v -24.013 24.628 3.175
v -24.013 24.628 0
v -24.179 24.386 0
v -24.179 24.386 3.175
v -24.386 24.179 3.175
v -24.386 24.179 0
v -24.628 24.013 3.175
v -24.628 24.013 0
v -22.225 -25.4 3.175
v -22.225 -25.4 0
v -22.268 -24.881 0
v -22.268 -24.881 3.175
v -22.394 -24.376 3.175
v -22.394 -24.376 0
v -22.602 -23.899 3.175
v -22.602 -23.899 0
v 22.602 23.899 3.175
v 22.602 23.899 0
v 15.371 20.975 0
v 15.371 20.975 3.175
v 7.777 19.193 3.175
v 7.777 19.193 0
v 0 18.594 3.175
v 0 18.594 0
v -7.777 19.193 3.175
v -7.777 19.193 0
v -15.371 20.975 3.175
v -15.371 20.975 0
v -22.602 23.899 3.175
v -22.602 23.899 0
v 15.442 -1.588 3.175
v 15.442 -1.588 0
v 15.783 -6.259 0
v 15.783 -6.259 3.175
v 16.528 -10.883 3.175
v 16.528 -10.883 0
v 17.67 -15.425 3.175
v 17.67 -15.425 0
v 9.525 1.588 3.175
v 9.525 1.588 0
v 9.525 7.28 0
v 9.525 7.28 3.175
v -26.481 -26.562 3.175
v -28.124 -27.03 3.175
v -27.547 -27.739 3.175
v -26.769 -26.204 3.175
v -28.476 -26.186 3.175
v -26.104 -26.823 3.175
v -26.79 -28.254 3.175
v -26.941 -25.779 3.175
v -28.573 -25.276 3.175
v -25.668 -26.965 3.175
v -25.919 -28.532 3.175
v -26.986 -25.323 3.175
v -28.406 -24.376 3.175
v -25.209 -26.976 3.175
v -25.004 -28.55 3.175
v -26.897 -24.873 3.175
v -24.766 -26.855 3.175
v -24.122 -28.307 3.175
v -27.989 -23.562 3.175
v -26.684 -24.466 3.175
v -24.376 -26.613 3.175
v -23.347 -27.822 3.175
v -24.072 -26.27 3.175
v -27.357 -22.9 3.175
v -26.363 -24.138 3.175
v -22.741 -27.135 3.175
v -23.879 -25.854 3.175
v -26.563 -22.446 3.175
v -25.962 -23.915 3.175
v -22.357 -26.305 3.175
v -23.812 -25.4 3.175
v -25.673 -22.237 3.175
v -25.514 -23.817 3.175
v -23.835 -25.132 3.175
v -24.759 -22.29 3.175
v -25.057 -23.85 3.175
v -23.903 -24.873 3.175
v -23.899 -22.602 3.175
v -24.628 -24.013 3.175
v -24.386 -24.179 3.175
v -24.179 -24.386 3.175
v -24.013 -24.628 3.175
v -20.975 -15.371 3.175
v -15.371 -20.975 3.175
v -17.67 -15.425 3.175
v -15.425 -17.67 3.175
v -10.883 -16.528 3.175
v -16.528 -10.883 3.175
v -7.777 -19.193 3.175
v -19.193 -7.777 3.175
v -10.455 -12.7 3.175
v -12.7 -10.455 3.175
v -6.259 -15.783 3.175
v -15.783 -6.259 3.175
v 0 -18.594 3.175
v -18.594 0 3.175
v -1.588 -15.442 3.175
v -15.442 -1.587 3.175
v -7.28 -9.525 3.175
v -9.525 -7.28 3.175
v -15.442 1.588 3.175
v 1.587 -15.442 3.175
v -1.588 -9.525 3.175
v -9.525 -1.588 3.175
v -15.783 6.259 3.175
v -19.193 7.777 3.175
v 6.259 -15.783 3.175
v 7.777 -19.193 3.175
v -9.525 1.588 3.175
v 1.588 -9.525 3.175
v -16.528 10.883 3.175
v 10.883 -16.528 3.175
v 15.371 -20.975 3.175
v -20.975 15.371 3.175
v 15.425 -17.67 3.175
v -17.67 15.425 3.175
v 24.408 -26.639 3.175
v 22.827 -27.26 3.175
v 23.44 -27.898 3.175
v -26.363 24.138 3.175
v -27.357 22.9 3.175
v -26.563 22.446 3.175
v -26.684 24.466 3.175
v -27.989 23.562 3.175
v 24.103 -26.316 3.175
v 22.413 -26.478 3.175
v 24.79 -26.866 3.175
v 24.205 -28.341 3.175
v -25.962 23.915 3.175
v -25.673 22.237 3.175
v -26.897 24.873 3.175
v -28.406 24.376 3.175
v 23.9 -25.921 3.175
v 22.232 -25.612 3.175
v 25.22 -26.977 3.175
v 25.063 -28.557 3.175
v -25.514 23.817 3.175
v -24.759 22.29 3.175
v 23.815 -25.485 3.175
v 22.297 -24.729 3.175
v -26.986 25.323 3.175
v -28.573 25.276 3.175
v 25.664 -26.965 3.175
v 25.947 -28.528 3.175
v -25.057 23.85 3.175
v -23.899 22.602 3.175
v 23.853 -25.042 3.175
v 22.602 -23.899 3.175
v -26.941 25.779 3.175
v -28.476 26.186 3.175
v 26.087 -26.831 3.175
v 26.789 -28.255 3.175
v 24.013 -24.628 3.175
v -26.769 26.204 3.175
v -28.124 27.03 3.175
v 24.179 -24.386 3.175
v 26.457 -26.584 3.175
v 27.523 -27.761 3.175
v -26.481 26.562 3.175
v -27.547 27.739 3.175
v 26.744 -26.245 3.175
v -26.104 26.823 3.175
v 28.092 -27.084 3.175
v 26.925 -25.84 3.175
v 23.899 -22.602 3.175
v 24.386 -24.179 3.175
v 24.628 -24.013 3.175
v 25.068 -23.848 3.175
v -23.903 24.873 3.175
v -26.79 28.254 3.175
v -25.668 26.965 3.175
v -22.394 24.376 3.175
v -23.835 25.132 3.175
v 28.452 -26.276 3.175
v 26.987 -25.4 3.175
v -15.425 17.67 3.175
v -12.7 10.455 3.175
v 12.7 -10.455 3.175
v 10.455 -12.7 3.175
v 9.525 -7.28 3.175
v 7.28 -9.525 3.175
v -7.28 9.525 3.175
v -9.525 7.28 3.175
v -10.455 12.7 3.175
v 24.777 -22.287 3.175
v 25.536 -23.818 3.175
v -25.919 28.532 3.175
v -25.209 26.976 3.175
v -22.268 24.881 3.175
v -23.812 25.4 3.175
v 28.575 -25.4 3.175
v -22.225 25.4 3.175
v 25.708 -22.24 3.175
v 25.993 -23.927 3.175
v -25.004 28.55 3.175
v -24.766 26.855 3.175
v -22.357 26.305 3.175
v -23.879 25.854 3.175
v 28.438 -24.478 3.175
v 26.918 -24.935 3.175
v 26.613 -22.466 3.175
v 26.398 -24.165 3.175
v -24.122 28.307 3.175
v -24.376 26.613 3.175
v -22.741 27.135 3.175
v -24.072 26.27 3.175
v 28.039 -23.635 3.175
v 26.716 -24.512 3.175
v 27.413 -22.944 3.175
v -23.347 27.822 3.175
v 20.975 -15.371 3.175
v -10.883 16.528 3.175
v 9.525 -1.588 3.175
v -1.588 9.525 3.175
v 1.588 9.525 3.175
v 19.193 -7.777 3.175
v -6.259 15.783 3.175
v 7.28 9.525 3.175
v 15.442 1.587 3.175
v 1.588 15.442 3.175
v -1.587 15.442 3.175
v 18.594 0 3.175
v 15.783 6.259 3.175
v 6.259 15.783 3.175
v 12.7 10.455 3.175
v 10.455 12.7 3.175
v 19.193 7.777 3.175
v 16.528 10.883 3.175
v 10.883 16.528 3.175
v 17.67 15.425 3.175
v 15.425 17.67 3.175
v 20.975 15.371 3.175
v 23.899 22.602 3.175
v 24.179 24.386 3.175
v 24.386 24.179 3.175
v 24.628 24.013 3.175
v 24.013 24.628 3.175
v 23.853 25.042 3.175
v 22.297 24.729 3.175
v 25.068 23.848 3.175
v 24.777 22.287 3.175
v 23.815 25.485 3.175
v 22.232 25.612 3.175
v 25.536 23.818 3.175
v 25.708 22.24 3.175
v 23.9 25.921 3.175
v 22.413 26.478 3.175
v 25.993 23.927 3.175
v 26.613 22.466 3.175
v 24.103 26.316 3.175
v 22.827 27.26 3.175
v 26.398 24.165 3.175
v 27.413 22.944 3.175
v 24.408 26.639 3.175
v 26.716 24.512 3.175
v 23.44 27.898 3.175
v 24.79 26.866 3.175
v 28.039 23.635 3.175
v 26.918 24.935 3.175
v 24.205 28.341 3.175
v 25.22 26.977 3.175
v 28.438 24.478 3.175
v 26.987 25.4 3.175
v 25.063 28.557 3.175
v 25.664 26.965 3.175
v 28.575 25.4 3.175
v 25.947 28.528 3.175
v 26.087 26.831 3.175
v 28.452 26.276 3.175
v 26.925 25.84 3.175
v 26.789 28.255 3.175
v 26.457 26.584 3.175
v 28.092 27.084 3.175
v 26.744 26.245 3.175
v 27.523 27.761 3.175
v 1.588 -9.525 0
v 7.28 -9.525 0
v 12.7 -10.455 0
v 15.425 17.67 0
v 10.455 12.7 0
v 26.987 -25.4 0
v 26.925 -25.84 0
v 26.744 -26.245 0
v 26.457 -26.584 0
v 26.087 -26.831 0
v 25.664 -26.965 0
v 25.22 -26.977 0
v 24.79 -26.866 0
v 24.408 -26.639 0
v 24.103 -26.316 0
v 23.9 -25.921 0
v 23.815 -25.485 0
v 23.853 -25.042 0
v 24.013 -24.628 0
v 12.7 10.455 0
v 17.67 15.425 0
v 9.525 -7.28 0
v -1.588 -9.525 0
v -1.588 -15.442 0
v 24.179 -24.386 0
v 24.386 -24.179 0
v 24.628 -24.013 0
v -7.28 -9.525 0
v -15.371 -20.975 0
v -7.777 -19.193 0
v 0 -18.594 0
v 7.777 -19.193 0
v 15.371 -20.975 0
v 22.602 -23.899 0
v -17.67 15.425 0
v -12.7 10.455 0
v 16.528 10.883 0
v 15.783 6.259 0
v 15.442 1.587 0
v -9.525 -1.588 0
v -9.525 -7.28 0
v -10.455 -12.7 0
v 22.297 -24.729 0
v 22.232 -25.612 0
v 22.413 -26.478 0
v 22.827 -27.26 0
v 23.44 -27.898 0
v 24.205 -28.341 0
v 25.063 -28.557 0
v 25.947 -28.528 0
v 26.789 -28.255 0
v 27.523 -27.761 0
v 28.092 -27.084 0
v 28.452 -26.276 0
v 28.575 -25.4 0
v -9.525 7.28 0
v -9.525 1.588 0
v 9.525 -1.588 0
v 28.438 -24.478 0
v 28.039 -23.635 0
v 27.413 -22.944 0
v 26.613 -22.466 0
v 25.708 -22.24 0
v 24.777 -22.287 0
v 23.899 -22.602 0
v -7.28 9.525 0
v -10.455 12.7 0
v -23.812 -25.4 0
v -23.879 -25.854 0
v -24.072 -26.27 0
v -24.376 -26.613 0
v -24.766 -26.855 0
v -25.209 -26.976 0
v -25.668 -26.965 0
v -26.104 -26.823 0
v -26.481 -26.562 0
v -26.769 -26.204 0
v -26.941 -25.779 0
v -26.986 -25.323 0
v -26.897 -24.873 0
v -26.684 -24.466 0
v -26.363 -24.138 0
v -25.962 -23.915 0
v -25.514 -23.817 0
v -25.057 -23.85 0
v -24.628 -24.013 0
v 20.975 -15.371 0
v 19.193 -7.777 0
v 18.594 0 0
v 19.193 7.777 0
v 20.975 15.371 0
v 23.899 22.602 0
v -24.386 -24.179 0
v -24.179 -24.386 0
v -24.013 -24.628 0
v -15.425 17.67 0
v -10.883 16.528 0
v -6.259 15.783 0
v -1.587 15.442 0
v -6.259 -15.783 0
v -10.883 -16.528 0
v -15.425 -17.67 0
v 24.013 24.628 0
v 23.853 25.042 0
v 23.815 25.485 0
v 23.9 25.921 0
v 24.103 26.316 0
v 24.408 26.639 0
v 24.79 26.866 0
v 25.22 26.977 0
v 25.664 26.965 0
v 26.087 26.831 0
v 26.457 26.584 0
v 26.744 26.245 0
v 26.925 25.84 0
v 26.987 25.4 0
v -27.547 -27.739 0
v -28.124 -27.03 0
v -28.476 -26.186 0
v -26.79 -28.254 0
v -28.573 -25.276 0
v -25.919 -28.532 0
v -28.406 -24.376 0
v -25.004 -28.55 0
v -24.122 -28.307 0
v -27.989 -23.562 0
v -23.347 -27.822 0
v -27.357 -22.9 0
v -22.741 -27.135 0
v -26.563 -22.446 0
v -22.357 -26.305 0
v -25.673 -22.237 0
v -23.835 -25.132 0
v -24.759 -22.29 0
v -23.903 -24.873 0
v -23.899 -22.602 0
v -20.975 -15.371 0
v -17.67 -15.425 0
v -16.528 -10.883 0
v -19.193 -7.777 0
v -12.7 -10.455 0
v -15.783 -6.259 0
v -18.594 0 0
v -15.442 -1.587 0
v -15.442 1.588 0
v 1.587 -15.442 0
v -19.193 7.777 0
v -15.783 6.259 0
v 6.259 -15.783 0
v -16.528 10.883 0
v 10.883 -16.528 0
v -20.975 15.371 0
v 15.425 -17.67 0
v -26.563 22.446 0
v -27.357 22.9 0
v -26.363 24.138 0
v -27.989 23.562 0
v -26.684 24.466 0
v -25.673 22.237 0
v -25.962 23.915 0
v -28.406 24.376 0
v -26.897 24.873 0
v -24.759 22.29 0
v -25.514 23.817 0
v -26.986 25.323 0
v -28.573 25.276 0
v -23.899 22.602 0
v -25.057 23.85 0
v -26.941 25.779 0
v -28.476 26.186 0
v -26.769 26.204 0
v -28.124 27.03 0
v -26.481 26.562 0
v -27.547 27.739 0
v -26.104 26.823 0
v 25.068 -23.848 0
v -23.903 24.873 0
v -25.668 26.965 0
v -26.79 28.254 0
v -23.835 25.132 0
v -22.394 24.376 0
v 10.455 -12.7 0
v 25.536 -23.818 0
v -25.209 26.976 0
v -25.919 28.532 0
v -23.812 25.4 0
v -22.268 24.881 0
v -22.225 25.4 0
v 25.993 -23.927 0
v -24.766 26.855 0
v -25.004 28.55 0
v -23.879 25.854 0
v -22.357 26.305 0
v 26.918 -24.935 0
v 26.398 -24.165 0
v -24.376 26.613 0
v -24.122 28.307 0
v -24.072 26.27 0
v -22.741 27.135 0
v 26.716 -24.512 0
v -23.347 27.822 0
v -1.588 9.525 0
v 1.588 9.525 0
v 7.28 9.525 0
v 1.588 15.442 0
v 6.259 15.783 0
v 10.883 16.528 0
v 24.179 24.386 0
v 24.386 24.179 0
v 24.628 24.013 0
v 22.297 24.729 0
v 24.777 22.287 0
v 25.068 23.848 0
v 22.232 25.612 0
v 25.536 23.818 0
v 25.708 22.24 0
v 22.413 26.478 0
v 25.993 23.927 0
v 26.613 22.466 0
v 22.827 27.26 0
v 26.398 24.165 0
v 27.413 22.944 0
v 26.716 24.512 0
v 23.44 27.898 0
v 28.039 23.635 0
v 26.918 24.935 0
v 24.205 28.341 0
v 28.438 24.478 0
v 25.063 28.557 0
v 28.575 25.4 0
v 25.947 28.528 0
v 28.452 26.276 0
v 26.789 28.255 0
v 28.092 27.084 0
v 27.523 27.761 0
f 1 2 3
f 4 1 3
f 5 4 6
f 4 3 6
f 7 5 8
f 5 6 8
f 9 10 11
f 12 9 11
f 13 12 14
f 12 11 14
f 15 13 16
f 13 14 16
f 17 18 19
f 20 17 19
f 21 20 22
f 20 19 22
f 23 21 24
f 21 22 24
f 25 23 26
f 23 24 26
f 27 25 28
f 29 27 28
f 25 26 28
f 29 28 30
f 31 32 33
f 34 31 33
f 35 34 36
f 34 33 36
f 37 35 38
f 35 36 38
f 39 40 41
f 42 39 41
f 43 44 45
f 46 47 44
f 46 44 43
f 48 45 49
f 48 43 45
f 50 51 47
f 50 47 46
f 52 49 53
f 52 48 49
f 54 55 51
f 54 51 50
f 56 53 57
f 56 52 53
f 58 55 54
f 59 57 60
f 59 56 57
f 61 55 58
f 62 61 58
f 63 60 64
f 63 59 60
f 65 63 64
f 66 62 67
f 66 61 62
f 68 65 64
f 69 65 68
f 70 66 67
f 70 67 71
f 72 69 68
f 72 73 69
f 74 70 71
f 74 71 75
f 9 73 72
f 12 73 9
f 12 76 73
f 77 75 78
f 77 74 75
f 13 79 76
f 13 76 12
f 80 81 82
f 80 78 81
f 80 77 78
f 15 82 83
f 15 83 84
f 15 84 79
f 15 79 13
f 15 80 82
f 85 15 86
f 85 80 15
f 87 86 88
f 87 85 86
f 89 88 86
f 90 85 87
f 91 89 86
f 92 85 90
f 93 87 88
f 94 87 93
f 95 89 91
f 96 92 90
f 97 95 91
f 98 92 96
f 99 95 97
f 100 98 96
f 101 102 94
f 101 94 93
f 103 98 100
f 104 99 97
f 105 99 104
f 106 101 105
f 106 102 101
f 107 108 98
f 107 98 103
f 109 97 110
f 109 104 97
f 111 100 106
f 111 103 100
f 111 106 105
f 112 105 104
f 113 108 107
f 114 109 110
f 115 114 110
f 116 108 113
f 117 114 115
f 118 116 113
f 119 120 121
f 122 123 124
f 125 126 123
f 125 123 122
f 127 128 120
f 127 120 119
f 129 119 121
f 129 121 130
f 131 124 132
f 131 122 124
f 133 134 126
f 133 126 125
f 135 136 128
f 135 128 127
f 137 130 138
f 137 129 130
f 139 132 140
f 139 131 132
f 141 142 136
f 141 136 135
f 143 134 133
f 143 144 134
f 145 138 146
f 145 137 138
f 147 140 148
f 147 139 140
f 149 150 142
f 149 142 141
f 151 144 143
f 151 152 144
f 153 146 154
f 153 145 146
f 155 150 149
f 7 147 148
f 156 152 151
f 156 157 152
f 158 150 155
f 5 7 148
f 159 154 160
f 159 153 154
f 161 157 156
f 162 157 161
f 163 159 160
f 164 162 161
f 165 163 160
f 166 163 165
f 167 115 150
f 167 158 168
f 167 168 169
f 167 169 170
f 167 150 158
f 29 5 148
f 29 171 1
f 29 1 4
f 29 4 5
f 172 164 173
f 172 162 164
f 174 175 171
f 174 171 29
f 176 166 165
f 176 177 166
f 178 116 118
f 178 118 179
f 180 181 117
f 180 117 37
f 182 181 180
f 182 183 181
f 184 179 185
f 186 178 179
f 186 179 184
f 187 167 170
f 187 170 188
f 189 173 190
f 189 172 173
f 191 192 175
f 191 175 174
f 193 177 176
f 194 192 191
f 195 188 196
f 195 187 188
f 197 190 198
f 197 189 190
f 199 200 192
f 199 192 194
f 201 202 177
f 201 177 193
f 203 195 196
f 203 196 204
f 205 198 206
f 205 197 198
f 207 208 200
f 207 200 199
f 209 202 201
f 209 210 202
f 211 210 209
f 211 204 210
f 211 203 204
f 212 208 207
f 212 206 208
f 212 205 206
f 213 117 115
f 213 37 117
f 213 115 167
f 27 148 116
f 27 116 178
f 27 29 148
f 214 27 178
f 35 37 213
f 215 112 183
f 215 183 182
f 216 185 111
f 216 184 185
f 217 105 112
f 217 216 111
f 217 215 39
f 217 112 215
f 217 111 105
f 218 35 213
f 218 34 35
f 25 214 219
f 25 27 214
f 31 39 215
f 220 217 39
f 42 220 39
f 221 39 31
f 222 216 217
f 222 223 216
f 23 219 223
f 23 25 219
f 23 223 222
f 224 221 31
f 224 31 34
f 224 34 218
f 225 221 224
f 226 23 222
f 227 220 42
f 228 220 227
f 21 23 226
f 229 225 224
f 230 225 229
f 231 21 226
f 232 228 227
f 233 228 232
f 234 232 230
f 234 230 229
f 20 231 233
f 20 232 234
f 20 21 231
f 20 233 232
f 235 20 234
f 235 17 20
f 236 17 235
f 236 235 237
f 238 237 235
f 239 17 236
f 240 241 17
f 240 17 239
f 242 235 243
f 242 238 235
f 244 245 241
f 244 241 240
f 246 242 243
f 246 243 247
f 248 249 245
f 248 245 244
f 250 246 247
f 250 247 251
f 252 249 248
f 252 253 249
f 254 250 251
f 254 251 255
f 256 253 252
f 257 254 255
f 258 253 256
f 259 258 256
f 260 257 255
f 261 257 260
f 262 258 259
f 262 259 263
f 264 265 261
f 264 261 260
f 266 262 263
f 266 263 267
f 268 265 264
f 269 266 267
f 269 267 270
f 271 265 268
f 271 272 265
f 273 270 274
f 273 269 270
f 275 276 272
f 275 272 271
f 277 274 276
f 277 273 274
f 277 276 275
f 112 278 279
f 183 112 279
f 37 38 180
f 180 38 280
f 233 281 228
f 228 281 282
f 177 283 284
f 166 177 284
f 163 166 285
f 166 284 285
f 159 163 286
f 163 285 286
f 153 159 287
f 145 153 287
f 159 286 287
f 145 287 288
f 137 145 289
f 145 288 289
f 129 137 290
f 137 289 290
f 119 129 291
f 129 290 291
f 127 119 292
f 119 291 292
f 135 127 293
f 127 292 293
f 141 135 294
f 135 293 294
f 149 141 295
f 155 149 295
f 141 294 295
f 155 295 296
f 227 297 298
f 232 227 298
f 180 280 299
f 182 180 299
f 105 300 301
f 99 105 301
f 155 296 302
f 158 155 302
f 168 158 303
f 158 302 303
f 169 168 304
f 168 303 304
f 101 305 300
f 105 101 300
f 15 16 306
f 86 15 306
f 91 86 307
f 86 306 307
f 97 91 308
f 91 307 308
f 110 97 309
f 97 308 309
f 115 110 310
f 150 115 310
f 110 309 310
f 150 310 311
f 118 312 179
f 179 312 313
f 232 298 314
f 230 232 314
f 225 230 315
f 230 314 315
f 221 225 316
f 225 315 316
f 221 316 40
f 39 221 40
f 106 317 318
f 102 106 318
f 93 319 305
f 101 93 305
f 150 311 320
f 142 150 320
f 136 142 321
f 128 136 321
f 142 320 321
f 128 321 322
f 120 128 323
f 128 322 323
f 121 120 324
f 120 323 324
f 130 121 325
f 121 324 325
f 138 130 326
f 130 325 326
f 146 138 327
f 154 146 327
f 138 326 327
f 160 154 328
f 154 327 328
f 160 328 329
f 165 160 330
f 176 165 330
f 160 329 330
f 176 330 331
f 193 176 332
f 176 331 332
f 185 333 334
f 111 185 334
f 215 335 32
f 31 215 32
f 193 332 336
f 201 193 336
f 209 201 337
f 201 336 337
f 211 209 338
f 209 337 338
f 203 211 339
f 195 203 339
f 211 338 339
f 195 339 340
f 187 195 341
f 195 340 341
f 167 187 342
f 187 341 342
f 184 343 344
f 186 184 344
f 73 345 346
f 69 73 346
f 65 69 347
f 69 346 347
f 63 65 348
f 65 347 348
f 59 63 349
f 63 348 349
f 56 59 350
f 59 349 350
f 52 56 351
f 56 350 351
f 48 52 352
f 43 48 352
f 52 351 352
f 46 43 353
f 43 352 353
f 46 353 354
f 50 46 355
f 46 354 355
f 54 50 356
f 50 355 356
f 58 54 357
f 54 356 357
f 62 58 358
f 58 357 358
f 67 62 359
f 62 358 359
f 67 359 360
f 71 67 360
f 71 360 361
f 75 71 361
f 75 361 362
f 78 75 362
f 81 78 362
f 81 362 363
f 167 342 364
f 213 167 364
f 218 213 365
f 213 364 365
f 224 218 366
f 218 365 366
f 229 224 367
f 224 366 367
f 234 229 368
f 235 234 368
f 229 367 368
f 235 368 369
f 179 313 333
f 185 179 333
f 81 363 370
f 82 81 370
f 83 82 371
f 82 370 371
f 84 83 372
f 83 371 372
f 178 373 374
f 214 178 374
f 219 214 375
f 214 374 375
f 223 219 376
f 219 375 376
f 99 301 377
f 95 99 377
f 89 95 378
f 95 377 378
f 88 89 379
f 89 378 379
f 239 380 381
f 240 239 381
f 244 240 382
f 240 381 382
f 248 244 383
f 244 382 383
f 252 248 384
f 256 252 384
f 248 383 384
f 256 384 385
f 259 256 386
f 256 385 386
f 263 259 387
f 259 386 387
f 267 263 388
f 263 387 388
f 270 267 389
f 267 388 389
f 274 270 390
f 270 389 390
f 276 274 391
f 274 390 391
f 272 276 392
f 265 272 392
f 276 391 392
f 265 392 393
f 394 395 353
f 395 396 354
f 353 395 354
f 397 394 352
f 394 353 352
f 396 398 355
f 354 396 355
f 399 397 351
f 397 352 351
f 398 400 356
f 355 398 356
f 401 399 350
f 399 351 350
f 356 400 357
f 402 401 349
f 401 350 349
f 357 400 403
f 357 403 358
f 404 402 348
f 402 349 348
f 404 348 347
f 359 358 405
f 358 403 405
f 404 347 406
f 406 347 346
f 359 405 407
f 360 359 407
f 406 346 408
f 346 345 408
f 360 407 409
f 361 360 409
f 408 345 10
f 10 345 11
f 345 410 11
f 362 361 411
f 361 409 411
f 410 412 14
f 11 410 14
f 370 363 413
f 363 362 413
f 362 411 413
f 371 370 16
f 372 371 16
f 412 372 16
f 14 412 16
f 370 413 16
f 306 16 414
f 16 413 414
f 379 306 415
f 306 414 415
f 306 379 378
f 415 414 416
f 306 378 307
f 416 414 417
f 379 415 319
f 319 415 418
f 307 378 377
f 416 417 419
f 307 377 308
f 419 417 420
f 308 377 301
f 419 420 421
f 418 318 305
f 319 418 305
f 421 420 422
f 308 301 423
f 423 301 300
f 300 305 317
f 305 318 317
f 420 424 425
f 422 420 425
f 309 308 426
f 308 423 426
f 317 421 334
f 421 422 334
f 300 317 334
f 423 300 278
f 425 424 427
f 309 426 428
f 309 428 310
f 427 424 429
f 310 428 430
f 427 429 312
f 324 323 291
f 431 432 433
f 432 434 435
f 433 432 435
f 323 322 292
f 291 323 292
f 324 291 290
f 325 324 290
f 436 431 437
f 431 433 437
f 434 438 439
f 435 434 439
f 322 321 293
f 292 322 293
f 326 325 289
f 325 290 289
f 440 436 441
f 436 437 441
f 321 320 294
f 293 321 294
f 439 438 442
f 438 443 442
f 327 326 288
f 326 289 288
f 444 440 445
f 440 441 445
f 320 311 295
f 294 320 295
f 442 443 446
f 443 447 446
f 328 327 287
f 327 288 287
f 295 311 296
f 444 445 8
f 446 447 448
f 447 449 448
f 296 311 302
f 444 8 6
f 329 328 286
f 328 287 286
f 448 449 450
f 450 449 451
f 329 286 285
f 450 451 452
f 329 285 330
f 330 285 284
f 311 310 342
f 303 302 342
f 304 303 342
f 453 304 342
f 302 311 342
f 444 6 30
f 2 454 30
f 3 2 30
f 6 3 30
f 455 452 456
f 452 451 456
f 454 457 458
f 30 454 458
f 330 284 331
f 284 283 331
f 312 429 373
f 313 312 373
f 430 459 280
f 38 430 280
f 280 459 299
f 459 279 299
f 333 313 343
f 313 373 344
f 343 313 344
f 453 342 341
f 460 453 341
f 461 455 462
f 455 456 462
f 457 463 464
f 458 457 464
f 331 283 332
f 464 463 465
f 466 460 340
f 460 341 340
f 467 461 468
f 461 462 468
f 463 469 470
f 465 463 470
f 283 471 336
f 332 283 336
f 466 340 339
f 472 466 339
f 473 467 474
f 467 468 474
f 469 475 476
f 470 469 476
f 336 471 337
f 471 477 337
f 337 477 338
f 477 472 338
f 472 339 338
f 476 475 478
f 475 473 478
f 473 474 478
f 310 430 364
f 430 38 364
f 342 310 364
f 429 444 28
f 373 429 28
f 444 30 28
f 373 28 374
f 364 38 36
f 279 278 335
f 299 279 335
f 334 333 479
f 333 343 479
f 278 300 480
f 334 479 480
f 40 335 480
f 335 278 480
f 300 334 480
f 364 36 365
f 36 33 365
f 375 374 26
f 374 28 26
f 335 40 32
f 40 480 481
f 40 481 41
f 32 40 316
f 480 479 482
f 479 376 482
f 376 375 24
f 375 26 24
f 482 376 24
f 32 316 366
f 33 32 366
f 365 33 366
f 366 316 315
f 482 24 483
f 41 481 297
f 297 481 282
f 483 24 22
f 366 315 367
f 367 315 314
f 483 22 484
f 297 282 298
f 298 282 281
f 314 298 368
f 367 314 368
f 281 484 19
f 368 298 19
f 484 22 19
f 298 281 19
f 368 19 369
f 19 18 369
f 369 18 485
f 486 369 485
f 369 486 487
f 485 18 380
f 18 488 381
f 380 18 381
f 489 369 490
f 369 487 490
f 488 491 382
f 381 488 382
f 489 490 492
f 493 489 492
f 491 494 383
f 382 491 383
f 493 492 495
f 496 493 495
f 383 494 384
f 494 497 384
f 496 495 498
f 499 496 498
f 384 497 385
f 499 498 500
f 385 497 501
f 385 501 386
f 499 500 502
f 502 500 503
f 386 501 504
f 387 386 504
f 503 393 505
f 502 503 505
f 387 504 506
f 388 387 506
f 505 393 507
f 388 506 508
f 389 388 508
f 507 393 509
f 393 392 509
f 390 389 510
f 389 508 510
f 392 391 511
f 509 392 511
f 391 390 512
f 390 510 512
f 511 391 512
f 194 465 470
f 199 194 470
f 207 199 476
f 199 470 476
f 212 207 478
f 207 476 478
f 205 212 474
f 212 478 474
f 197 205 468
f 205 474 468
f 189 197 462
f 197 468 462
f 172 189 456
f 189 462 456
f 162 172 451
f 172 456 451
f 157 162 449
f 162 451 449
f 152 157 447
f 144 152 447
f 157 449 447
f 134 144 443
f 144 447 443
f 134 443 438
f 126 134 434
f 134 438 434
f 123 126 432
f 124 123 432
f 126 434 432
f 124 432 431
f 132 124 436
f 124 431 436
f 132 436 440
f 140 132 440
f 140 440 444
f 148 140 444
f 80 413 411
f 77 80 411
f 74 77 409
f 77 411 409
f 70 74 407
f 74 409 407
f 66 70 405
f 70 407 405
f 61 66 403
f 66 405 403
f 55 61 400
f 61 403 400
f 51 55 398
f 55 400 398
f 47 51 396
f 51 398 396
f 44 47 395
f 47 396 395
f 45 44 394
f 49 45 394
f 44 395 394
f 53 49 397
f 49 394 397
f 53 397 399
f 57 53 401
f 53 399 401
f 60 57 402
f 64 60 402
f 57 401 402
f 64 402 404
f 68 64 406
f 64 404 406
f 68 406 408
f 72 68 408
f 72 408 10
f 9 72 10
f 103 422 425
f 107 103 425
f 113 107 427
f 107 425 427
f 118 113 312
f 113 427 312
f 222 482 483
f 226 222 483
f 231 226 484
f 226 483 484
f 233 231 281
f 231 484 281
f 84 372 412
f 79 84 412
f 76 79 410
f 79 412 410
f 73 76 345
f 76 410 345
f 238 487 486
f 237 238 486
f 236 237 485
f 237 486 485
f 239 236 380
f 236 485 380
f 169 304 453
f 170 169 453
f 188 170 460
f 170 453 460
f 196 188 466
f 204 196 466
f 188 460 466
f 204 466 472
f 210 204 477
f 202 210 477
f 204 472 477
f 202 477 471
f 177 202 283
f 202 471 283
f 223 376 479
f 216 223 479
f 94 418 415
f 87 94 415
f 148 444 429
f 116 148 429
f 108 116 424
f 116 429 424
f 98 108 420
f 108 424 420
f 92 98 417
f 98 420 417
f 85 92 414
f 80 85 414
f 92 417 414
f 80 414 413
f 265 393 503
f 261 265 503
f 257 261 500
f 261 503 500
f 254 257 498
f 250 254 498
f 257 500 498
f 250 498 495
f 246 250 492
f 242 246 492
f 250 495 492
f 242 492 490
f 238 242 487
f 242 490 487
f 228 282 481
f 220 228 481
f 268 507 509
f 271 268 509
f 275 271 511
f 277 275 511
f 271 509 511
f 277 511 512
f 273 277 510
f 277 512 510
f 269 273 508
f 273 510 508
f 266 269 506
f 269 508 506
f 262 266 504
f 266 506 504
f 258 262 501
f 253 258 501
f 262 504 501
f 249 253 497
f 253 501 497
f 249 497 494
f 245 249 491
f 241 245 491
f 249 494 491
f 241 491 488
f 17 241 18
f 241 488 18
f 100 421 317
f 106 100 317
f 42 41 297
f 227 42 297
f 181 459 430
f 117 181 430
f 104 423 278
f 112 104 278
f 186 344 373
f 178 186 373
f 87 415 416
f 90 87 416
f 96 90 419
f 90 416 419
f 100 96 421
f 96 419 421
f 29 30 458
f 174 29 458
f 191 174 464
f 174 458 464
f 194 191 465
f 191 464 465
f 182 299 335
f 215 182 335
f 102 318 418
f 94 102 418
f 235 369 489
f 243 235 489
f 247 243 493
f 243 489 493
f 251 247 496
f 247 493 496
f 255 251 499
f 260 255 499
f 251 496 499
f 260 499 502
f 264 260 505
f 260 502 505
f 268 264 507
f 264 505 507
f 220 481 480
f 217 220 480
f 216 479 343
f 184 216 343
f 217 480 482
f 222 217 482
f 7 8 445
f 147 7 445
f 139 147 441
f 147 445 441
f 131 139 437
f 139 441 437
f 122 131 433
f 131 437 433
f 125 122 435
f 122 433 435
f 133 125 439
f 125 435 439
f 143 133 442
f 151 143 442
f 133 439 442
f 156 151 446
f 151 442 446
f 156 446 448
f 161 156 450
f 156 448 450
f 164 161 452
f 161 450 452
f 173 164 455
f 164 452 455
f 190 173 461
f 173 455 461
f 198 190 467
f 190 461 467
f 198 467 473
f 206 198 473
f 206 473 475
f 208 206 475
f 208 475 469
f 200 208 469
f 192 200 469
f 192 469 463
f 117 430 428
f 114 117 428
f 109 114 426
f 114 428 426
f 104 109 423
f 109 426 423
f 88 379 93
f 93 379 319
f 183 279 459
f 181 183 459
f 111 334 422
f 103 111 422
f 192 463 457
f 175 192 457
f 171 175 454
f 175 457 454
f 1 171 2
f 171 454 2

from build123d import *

# Parameters (mm, degrees)
F1_DEPTH = 3.175


with BuildPart() as f1:
    # F0 (on Top) → F1 (new body)
    with BuildSketch(Plane.XY):
        with BuildLine():
            ThreePointArc((-23.8992012939, 22.602102889), (-18.5940905122, 0), (-23.8992012939, -22.602102889))
            ThreePointArc((-23.8992012939, -22.602102889), (-23.1549359697, -23.1549359697), (-22.602102889, -23.8992012939))
            ThreePointArc((-22.602102889, -23.8992012939), (0, -18.5940905122), (22.602102889, -23.8992012939))
            ThreePointArc((22.602102889, -23.8992012939), (23.1549359697, -23.1549359697), (23.8992012939, -22.602102889))
            ThreePointArc((23.8992012939, -22.602102889), (18.5940905122, 0), (23.8992012939, 22.602102889))
            ThreePointArc((23.8992012939, 22.602102889), (23.1549359697, 23.1549359697), (22.602102889, 23.8992012939))
            ThreePointArc((22.602102889, 23.8992012939), (0, 18.5940905122), (-22.602102889, 23.8992012939))
            ThreePointArc((-22.602102889, 23.8992012939), (-23.1549359697, 23.1549359697), (-23.8992012939, 22.602102889))
        make_face()
        with BuildLine():
            ThreePointArc((15.4250677087, 17.6701317389), (17.1210557178, 18.2064936151), (18.7984489975, 18.7984489975))
            ThreePointArc((18.7984489975, 18.7984489975), (18.2064936151, 17.1210557178), (17.6701317389, 15.4250677087))
            ThreePointArc((17.6701317389, 15.4250677087), (16.1052257406, 8.5788994836), (15.4424411515, 1.5875))
            Line((15.4424411515, 1.5875), (15.875, 1.5875))
            Line((15.875, 1.5875), (15.875, -1.5875))
            Line((15.875, -1.5875), (15.4424411515, -1.5875))
            ThreePointArc((15.4424411515, -1.5875), (16.1052257406, -8.5788994836), (17.6701317389, -15.4250677087))
            ThreePointArc((17.6701317389, -15.4250677087), (18.2064936151, -17.1210557178), (18.7984489975, -18.7984489975))
            ThreePointArc((18.7984489975, -18.7984489975), (17.1210557178, -18.2064936151), (15.4250677087, -17.6701317389))
            ThreePointArc((15.4250677087, -17.6701317389), (8.5788994836, -16.1052257406), (1.5875, -15.4424411515))
            Line((1.5875, -15.4424411515), (1.5875, -15.875))
            Line((1.5875, -15.875), (-1.5875, -15.875))
            Line((-1.5875, -15.875), (-1.5875, -15.4424411515))
            ThreePointArc((-1.5875, -15.4424411515), (-8.5788994836, -16.1052257406), (-15.4250677087, -17.6701317389))
            ThreePointArc((-15.4250677087, -17.6701317389), (-17.1210557178, -18.2064936151), (-18.7984489975, -18.7984489975))
            ThreePointArc((-18.7984489975, -18.7984489975), (-18.2064936151, -17.1210557178), (-17.6701317389, -15.4250677087))
            ThreePointArc((-17.6701317389, -15.4250677087), (-16.1052257406, -8.5788994836), (-15.4424411515, -1.5875))
            Line((-15.4424411515, -1.5875), (-15.875, -1.5875))
            Line((-15.875, -1.5875), (-15.875, 1.5875))
            Line((-15.875, 1.5875), (-15.4424411515, 1.5875))
            ThreePointArc((-15.4424411515, 1.5875), (-16.1052257406, 8.5788994836), (-17.6701317389, 15.4250677087))
            ThreePointArc((-17.6701317389, 15.4250677087), (-18.2064936151, 17.1210557178), (-18.7984489975, 18.7984489975))
            ThreePointArc((-18.7984489975, 18.7984489975), (-17.1210557178, 18.2064936151), (-15.4250677087, 17.6701317389))
            ThreePointArc((-15.4250677087, 17.6701317389), (-8.5788994836, 16.1052257406), (-1.5875, 15.4424411515))
            Line((-1.5875, 15.4424411515), (-1.5875, 15.875))
            Line((-1.5875, 15.875), (1.5875, 15.875))
            Line((1.5875, 15.875), (1.5875, 15.4424411515))
            ThreePointArc((1.5875, 15.4424411515), (8.5788994836, 16.1052257406), (15.4250677087, 17.6701317389))
        make_face(mode=Mode.SUBTRACT)
        Polygon((9.525, 7.2799359697), (7.2799359697, 9.525), (1.5875, 9.525), (-1.5875, 9.525), (-7.2799359697, 9.525), (-9.525, 7.2799359697), (-9.525, 1.5875), (-9.525, -1.5875), (-9.525, -7.2799359697), (-7.2799359697, -9.525), (-1.5875, -9.525), (1.5875, -9.525), (7.2799359697, -9.525), (9.525, -7.2799359697), (9.525, -1.5875), (9.525, 1.5875), align=None)
        Polygon((-12.7, -10.4549359697), (-17.6701317389, -15.4250677087), (-15.4250677087, -17.6701317389), (-10.4549359697, -12.7), (-7.2799359697, -9.525), (-9.525, -9.525), (-9.525, -7.2799359697), align=None)
        Polygon((-10.4549359697, 12.7), (-15.4250677087, 17.6701317389), (-17.6701317389, 15.4250677087), (-12.7, 10.4549359697), (-9.525, 7.2799359697), (-9.525, 9.525), (-7.2799359697, 9.525), align=None)
        Polygon((17.6701317389, 15.4250677087), (15.4250677087, 17.6701317389), (10.4549359697, 12.7), (7.2799359697, 9.525), (9.525, 9.525), (9.525, 7.2799359697), (12.7, 10.4549359697), align=None)
        Polygon((15.4250677087, -17.6701317389), (17.6701317389, -15.4250677087), (12.7, -10.4549359697), (9.525, -7.2799359697), (9.525, -9.525), (7.2799359697, -9.525), (10.4549359697, -12.7), align=None)
        with BuildLine():
            ThreePointArc((-23.8125, -25.4), (-26.7685720081, -26.2044668474), (-24.6278283887, -24.0129501621))
            ThreePointArc((-24.6278283887, -24.0129501621), (-24.2580020364, -23.3103735942), (-23.8992012939, -22.602102889))
            ThreePointArc((-23.8992012939, -22.602102889), (-28.1244871895, -27.03027438), (-22.225, -25.4))
            ThreePointArc((-22.225, -25.4), (-22.3207185637, -24.6262747023), (-22.602102889, -23.8992012939))
            ThreePointArc((-22.602102889, -23.8992012939), (-23.3103735942, -24.2580020364), (-24.0129501621, -24.6278283887))
            ThreePointArc((-24.0129501621, -24.6278283887), (-23.8634294895, -25.0011174155), (-23.8125, -25.4))
        make_face()
        with BuildLine():
            ThreePointArc((-22.225, 25.4), (-28.1244871895, 27.03027438), (-23.8992012939, 22.602102889))
            ThreePointArc((-23.8992012939, 22.602102889), (-24.2580020364, 23.3103735942), (-24.6278283887, 24.0129501621))
            ThreePointArc((-24.6278283887, 24.0129501621), (-26.7685720081, 26.2044668474), (-23.8125, 25.4))
            ThreePointArc((-23.8125, 25.4), (-23.8634294895, 25.0011174155), (-24.0129501621, 24.6278283887))
            ThreePointArc((-24.0129501621, 24.6278283887), (-23.3103735942, 24.2580020364), (-22.602102889, 23.8992012939))
            ThreePointArc((-22.602102889, 23.8992012939), (-22.3207185637, 24.6262747023), (-22.225, 25.4))
        make_face()
        with BuildLine():
            ThreePointArc((28.575, 25.4), (24.6262747023, 28.4792814363), (22.602102889, 23.8992012939))
            ThreePointArc((22.602102889, 23.8992012939), (23.3103735942, 24.2580020364), (24.0129501621, 24.6278283887))
            ThreePointArc((24.0129501621, 24.6278283887), (25.0011174155, 26.9365705105), (26.9875, 25.4))
            ThreePointArc((26.9875, 25.4), (26.2044668474, 24.0314279919), (24.6278283887, 24.0129501621))
            ThreePointArc((24.6278283887, 24.0129501621), (24.2580020364, 23.3103735942), (23.8992012939, 22.602102889))
            ThreePointArc((23.8992012939, 22.602102889), (27.03027438, 22.6755128105), (28.575, 25.4))
        make_face()
        with BuildLine():
            ThreePointArc((24.0129501621, -24.6278283887), (23.3103735942, -24.2580020364), (22.602102889, -23.8992012939))
            ThreePointArc((22.602102889, -23.8992012939), (24.6262747023, -28.4792814363), (28.575, -25.4))
            ThreePointArc((28.575, -25.4), (27.03027438, -22.6755128105), (23.8992012939, -22.602102889))
            ThreePointArc((23.8992012939, -22.602102889), (24.2580020364, -23.3103735942), (24.6278283887, -24.0129501621))
            ThreePointArc((24.6278283887, -24.0129501621), (26.2044668474, -24.0314279919), (26.9875, -25.4))
            ThreePointArc((26.9875, -25.4), (25.0011174155, -26.9365705105), (24.0129501621, -24.6278283887))
        make_face()
        with BuildLine():
            Line((1.5875, 12.7), (1.5875, 15.4424411515))
            ThreePointArc((1.5875, 15.4424411515), (0, 15.4190905122), (-1.5875, 15.4424411515))
            Line((-1.5875, 15.4424411515), (-1.5875, 12.7))
            Line((-1.5875, 12.7), (-1.5875, 9.525))
            Line((-1.5875, 9.525), (1.5875, 9.525))
            Line((1.5875, 9.525), (1.5875, 12.7))
        make_face()
        with BuildLine():
            Line((-12.7, 1.5875), (-15.4424411515, 1.5875))
            ThreePointArc((-15.4424411515, 1.5875), (-15.4190905122, 0), (-15.4424411515, -1.5875))
            Line((-15.4424411515, -1.5875), (-12.7, -1.5875))
            Line((-12.7, -1.5875), (-9.525, -1.5875))
            Line((-9.525, -1.5875), (-9.525, 1.5875))
            Line((-9.525, 1.5875), (-12.7, 1.5875))
        make_face()
        with BuildLine():
            ThreePointArc((15.4424411515, -1.5875), (15.4190905122, 0), (15.4424411515, 1.5875))
            Line((15.4424411515, 1.5875), (12.7, 1.5875))
            Line((12.7, 1.5875), (9.525, 1.5875))
            Line((9.525, 1.5875), (9.525, -1.5875))
            Line((9.525, -1.5875), (12.7, -1.5875))
            Line((12.7, -1.5875), (15.4424411515, -1.5875))
        make_face()
        with BuildLine():
            ThreePointArc((-1.5875, -15.4424411515), (0, -15.4190905122), (1.5875, -15.4424411515))
            Line((1.5875, -15.4424411515), (1.5875, -12.7))
            Line((1.5875, -12.7), (1.5875, -9.525))
            Line((1.5875, -9.525), (-1.5875, -9.525))
            Line((-1.5875, -9.525), (-1.5875, -12.7))
            Line((-1.5875, -12.7), (-1.5875, -15.4424411515))
        make_face()
        with BuildLine():
            ThreePointArc((18.7984489975, -18.7984489975), (18.2064936151, -17.1210557178), (17.6701317389, -15.4250677087))
            Line((17.6701317389, -15.4250677087), (15.4250677087, -17.6701317389))
            ThreePointArc((15.4250677087, -17.6701317389), (17.1210557178, -18.2064936151), (18.7984489975, -18.7984489975))
        make_face()
        with BuildLine():
            ThreePointArc((17.6701317389, 15.4250677087), (18.2064936151, 17.1210557178), (18.7984489975, 18.7984489975))
            ThreePointArc((18.7984489975, 18.7984489975), (17.1210557178, 18.2064936151), (15.4250677087, 17.6701317389))
            Line((15.4250677087, 17.6701317389), (17.6701317389, 15.4250677087))
        make_face()
        with BuildLine():
            Line((-17.6701317389, 15.4250677087), (-15.4250677087, 17.6701317389))
            ThreePointArc((-15.4250677087, 17.6701317389), (-17.1210557178, 18.2064936151), (-18.7984489975, 18.7984489975))
            ThreePointArc((-18.7984489975, 18.7984489975), (-18.2064936151, 17.1210557178), (-17.6701317389, 15.4250677087))
        make_face()
        with BuildLine():
            Line((-15.4250677087, -17.6701317389), (-17.6701317389, -15.4250677087))
            ThreePointArc((-17.6701317389, -15.4250677087), (-18.2064936151, -17.1210557178), (-18.7984489975, -18.7984489975))
            ThreePointArc((-18.7984489975, -18.7984489975), (-17.1210557178, -18.2064936151), (-15.4250677087, -17.6701317389))
        make_face()
        Polygon((9.525, -9.525), (9.525, -7.2799359697), (7.2799359697, -9.525), align=None)
        Polygon((9.525, 9.525), (7.2799359697, 9.525), (9.525, 7.2799359697), align=None)
        Polygon((-9.525, 7.2799359697), (-7.2799359697, 9.525), (-9.525, 9.525), align=None)
        Polygon((-7.2799359697, -9.525), (-9.525, -7.2799359697), (-9.525, -9.525), align=None)
        with BuildLine():
            ThreePointArc((-24.6278283887, 24.0129501621), (-24.2580020364, 23.3103735942), (-23.8992012939, 22.602102889))
            ThreePointArc((-23.8992012939, 22.602102889), (-23.1549359697, 23.1549359697), (-22.602102889, 23.8992012939))
            ThreePointArc((-22.602102889, 23.8992012939), (-23.3103735942, 24.2580020364), (-24.0129501621, 24.6278283887))
            ThreePointArc((-24.0129501621, 24.6278283887), (-24.2774679849, 24.2774679849), (-24.6278283887, 24.0129501621))
        make_face()
        with BuildLine():
            ThreePointArc((24.0129501621, 24.6278283887), (23.3103735942, 24.2580020364), (22.602102889, 23.8992012939))
            ThreePointArc((22.602102889, 23.8992012939), (23.1549359697, 23.1549359697), (23.8992012939, 22.602102889))
            ThreePointArc((23.8992012939, 22.602102889), (24.2580020364, 23.3103735942), (24.6278283887, 24.0129501621))
            ThreePointArc((24.6278283887, 24.0129501621), (24.2774679849, 24.2774679849), (24.0129501621, 24.6278283887))
        make_face()
        with BuildLine():
            ThreePointArc((23.8992012939, -22.602102889), (23.1549359697, -23.1549359697), (22.602102889, -23.8992012939))
            ThreePointArc((22.602102889, -23.8992012939), (23.3103735942, -24.2580020364), (24.0129501621, -24.6278283887))
            ThreePointArc((24.0129501621, -24.6278283887), (24.2774679849, -24.2774679849), (24.6278283887, -24.0129501621))
            ThreePointArc((24.6278283887, -24.0129501621), (24.2580020364, -23.3103735942), (23.8992012939, -22.602102889))
        make_face()
        with BuildLine():
            ThreePointArc((-23.8992012939, -22.602102889), (-24.2580020364, -23.3103735942), (-24.6278283887, -24.0129501621))
            ThreePointArc((-24.6278283887, -24.0129501621), (-24.2774679849, -24.2774679849), (-24.0129501621, -24.6278283887))
            ThreePointArc((-24.0129501621, -24.6278283887), (-23.3103735942, -24.2580020364), (-22.602102889, -23.8992012939))
            ThreePointArc((-22.602102889, -23.8992012939), (-23.1549359697, -23.1549359697), (-23.8992012939, -22.602102889))
        make_face()
        with BuildLine():
            Line((1.5875, -15.875), (1.5875, -15.4424411515))
            ThreePointArc((1.5875, -15.4424411515), (0, -15.4190905122), (-1.5875, -15.4424411515))
            Line((-1.5875, -15.4424411515), (-1.5875, -15.875))
            Line((-1.5875, -15.875), (1.5875, -15.875))
        make_face()
        with BuildLine():
            ThreePointArc((-15.4424411515, -1.5875), (-15.4190905122, 0), (-15.4424411515, 1.5875))
            Line((-15.4424411515, 1.5875), (-15.875, 1.5875))
            Line((-15.875, 1.5875), (-15.875, -1.5875))
            Line((-15.875, -1.5875), (-15.4424411515, -1.5875))
        make_face()
        with BuildLine():
            ThreePointArc((-1.5875, 15.4424411515), (0, 15.4190905122), (1.5875, 15.4424411515))
            Line((1.5875, 15.4424411515), (1.5875, 15.875))
            Line((1.5875, 15.875), (-1.5875, 15.875))
            Line((-1.5875, 15.875), (-1.5875, 15.4424411515))
        make_face()
        with BuildLine():
            Line((15.875, 1.5875), (15.4424411515, 1.5875))
            ThreePointArc((15.4424411515, 1.5875), (15.4190905122, 0), (15.4424411515, -1.5875))
            Line((15.4424411515, -1.5875), (15.875, -1.5875))
            Line((15.875, -1.5875), (15.875, 1.5875))
        make_face()
    extrude(amount=F1_DEPTH)


solid = f1.part
